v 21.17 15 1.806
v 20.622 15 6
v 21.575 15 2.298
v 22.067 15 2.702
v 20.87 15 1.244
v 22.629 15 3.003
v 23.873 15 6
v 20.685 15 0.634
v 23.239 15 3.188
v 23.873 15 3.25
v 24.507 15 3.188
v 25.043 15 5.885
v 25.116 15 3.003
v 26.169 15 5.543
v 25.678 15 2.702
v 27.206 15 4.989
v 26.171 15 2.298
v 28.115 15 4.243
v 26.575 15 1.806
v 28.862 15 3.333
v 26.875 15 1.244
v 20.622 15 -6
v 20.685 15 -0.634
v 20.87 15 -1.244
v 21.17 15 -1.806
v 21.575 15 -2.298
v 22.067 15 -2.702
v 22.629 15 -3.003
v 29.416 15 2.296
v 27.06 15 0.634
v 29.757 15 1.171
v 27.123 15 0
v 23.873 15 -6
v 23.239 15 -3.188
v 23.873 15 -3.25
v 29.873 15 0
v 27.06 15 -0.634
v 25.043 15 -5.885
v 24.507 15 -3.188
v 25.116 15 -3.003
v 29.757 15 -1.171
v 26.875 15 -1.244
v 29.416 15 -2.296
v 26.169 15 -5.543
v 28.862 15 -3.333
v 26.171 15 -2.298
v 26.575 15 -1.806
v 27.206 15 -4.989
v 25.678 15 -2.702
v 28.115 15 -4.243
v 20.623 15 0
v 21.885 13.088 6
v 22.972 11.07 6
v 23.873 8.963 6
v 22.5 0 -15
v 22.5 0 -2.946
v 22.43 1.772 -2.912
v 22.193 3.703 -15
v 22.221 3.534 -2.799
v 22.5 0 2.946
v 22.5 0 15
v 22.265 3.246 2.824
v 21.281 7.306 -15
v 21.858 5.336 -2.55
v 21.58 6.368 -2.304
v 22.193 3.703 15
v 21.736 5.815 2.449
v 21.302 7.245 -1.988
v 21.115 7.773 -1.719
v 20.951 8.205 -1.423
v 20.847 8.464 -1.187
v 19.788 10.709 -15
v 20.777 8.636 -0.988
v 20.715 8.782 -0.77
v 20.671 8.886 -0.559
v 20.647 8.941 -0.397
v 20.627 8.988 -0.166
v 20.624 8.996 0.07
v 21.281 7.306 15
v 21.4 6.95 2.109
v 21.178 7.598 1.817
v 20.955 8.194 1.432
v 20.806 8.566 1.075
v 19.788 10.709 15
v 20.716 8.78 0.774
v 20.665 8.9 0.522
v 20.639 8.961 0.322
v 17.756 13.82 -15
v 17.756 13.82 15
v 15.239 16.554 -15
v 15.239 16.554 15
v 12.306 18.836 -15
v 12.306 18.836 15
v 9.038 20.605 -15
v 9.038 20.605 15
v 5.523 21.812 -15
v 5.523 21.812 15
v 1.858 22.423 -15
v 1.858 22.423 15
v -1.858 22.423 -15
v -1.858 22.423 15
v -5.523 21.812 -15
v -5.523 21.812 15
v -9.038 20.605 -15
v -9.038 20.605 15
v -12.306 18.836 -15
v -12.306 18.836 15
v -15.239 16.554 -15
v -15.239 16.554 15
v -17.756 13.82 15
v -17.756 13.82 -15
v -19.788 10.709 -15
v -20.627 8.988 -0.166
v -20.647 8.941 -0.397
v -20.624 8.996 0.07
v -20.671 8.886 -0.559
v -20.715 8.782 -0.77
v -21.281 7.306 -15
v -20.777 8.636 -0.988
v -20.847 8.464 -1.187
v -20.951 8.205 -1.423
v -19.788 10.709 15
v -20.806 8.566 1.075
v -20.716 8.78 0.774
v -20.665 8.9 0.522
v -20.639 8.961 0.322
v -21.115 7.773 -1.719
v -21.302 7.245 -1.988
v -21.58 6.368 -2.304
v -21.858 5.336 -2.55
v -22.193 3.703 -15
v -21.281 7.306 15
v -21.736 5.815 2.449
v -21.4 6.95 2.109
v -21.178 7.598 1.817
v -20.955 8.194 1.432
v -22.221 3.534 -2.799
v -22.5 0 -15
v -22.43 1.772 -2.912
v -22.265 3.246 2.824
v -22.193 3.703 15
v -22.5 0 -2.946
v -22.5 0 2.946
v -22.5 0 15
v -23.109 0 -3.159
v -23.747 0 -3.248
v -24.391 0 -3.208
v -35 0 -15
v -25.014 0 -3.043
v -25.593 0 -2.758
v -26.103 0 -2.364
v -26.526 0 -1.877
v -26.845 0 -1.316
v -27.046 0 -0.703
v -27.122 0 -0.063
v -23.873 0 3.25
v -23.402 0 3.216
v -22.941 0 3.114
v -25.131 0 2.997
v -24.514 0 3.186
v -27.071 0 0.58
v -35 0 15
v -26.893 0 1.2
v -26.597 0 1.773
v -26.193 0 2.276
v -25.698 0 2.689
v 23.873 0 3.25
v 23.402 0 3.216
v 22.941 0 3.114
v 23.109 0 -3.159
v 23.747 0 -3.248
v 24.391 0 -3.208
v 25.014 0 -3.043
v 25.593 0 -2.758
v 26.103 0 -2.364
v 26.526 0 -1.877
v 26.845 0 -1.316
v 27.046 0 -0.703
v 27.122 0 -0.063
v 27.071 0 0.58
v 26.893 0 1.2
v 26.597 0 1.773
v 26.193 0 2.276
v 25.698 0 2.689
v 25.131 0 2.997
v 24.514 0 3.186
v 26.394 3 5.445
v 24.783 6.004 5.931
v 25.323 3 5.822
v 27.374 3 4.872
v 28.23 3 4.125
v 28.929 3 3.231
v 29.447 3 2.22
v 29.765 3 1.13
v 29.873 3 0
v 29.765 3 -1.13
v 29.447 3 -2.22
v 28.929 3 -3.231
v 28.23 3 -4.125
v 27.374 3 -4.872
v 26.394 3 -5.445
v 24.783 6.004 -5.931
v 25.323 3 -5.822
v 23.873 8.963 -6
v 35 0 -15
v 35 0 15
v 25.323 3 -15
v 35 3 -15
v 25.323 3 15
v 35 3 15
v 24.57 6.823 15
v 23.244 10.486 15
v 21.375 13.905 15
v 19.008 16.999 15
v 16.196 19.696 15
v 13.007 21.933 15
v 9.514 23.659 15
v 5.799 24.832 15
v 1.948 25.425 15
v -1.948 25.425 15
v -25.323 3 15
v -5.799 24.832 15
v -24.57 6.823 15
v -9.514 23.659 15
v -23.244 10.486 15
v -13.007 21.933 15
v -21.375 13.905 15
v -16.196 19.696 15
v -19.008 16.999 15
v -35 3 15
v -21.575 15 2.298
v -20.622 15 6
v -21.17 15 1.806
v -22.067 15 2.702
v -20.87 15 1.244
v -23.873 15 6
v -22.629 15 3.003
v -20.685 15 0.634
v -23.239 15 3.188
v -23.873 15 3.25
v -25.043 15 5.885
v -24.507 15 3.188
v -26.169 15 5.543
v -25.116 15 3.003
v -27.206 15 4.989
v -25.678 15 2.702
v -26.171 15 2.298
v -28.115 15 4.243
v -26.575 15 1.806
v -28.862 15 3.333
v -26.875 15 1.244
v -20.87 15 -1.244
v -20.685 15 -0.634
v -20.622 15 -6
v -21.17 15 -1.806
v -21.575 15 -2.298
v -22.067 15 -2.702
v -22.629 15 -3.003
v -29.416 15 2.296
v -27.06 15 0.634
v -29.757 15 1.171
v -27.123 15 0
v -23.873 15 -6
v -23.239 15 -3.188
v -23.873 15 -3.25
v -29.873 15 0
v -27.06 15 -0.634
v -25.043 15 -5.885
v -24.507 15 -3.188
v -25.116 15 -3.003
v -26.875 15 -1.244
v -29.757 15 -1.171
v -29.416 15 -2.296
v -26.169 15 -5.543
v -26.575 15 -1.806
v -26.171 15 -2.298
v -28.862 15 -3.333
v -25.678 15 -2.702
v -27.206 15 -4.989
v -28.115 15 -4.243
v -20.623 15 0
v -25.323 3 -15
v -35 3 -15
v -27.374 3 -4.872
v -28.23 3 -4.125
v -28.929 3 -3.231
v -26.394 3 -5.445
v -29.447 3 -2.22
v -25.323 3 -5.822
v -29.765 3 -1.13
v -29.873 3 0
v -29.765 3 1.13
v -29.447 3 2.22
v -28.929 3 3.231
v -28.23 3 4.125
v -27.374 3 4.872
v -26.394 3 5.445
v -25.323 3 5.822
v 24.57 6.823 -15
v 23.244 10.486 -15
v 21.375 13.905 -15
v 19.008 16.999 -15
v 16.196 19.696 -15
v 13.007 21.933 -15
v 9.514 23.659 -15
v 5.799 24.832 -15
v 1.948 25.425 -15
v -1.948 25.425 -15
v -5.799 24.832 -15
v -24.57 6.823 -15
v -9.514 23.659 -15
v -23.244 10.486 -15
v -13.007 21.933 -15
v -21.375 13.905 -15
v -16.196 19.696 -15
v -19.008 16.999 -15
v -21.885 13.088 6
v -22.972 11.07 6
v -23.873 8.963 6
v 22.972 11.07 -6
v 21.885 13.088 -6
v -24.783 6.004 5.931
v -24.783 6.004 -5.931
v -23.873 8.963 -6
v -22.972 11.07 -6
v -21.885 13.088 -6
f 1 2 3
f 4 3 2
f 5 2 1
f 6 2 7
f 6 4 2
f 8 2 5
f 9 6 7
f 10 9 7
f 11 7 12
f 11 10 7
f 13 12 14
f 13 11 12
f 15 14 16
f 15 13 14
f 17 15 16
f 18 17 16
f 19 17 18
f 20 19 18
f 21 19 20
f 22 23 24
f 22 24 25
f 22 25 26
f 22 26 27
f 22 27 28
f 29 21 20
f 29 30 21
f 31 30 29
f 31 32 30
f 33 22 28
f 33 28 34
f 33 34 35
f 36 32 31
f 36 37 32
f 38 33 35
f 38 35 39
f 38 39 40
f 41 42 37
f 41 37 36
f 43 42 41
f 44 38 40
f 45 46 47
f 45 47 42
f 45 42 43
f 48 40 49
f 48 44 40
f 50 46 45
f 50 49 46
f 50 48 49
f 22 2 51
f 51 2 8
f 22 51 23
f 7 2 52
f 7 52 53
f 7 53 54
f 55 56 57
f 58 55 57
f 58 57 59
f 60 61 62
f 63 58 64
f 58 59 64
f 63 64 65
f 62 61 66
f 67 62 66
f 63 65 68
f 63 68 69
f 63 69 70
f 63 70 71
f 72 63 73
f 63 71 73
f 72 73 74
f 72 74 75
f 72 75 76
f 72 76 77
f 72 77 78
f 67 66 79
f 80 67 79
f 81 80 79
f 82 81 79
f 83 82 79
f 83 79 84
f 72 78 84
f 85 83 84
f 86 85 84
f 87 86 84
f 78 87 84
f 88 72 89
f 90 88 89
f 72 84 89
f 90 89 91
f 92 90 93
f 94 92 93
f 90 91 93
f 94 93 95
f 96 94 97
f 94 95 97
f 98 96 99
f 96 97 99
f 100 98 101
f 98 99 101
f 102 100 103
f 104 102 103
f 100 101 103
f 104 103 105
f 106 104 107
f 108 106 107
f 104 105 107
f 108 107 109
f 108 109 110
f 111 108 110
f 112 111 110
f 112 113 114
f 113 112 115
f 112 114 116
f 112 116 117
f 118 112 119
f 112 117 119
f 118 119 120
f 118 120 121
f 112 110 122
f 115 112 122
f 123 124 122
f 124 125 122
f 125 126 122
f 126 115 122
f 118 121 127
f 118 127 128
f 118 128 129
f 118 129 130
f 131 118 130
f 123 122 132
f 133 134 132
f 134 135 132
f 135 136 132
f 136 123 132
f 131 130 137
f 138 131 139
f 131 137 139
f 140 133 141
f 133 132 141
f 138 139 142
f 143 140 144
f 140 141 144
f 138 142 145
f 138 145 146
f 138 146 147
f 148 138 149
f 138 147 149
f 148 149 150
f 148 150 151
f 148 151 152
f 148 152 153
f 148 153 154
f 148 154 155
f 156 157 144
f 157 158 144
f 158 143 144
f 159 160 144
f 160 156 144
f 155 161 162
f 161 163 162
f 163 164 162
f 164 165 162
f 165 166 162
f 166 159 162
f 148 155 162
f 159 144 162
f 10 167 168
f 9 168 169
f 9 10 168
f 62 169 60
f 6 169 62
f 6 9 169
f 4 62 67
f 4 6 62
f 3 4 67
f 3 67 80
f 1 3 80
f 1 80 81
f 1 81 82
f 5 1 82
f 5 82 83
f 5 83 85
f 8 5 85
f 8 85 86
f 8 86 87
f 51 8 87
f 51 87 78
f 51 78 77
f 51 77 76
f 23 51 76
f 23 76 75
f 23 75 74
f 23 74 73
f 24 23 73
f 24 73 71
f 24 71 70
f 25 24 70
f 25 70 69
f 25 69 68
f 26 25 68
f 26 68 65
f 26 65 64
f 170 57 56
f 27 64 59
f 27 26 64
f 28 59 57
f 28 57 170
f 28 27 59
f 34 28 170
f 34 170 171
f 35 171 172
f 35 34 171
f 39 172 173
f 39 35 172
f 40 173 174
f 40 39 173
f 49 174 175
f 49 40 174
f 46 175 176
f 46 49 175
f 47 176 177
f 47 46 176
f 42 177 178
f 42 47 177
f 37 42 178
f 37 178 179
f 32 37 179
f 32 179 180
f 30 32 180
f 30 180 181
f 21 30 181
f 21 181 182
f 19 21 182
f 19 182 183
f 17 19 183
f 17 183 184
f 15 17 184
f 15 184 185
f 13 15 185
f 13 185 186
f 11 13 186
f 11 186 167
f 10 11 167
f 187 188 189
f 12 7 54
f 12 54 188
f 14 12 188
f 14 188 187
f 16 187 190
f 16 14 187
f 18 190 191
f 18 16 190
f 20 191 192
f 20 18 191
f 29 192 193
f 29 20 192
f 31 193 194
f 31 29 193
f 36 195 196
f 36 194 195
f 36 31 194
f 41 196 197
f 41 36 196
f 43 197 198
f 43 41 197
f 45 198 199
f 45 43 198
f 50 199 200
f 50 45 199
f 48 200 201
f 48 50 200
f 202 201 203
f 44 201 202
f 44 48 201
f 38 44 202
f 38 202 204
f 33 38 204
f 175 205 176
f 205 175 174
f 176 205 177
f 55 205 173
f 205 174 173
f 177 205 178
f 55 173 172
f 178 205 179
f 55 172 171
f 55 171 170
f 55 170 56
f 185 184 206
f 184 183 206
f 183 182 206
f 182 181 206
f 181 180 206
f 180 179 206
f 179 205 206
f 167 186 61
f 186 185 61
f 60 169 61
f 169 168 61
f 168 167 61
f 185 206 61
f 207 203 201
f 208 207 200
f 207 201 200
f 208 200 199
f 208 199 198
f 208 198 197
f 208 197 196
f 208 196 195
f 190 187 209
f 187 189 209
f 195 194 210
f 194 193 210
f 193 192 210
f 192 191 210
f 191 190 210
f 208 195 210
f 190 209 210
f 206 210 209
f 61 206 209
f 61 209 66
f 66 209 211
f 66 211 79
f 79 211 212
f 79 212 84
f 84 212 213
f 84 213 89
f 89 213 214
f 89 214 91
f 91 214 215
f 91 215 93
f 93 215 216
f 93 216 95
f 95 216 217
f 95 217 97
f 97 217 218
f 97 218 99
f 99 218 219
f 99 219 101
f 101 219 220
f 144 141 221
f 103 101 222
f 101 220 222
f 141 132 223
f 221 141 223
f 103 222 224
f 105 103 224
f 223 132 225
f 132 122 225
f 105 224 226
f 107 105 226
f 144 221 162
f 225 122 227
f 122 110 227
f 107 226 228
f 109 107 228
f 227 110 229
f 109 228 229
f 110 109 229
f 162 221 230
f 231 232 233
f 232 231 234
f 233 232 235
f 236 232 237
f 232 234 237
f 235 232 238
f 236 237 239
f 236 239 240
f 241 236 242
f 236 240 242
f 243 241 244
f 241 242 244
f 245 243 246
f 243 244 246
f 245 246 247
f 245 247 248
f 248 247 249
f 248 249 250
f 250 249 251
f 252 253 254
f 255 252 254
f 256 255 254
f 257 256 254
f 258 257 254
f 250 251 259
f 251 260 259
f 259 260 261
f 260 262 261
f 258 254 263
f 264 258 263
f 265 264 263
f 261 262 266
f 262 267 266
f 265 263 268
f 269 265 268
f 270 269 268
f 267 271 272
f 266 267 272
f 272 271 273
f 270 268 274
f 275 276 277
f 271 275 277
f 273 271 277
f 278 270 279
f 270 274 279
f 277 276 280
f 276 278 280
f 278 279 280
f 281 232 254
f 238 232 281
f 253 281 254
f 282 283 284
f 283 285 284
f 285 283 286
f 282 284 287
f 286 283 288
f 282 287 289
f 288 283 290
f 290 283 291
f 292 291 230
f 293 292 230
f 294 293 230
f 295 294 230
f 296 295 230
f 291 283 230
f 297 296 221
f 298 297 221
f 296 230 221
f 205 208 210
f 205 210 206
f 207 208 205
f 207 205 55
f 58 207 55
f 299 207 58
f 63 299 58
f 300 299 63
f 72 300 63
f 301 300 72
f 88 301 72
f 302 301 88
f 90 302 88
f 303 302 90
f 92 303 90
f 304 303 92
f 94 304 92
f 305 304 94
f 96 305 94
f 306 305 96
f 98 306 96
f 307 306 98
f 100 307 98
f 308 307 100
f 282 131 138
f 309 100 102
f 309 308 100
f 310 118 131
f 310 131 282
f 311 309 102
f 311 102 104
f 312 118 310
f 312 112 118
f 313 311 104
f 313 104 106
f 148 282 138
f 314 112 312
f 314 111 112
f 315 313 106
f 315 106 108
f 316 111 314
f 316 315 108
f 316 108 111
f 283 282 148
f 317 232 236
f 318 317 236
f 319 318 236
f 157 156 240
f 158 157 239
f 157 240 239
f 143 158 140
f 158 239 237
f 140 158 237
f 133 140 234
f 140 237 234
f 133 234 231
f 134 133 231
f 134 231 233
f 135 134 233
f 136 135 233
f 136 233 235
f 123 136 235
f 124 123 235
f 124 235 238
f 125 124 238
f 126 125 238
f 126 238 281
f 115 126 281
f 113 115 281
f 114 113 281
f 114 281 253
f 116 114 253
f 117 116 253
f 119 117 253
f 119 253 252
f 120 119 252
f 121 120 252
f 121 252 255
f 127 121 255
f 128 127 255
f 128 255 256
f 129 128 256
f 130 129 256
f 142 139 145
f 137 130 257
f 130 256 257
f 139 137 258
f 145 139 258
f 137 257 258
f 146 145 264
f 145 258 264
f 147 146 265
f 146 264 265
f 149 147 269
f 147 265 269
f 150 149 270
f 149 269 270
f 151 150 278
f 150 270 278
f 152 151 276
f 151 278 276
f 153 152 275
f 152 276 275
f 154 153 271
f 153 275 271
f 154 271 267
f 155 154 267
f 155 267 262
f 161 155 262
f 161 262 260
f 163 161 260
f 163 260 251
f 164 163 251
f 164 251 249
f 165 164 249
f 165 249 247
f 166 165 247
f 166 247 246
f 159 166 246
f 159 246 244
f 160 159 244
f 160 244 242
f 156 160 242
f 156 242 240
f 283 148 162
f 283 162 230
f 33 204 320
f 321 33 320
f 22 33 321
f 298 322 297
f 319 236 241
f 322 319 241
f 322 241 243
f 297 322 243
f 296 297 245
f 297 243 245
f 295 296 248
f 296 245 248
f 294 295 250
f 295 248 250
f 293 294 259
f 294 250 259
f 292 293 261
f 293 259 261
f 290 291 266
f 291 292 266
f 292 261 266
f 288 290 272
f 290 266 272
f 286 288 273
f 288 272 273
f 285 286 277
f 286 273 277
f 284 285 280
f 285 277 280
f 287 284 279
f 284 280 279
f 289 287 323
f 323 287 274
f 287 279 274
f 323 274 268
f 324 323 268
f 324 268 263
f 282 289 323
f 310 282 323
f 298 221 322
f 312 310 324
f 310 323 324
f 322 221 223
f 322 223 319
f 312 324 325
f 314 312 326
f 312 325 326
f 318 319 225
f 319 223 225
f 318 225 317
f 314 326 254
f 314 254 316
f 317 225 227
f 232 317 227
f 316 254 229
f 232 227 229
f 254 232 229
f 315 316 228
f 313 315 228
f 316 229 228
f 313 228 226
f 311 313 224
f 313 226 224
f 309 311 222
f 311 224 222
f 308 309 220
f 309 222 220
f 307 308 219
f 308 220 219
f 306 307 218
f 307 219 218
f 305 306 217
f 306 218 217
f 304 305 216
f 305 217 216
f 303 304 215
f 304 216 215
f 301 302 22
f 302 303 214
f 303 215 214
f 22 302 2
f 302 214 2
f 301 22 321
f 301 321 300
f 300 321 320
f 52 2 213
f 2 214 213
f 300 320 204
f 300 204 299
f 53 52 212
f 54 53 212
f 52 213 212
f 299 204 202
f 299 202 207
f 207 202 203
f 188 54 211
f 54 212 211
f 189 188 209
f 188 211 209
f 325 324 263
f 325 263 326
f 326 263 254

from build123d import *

# Parameters (mm, degrees)
BOSS_EXTRUDE4_DEPTH = 15
BOSS_EXTRUDE5_REACH = 42.927
SKETCH8_R           = 3.25
CUT_EXTRUDE1_DEPTH  = 41.926763896


with BuildPart() as part:
    # Sketch2 → Boss-Extrude4 (new, symmetric)
    with BuildSketch(Plane.XY):
        with BuildLine():
            Line((-22.5, 0), (-35, 0))
            Line((-35, 0), (-35, 3))
            Line((-35, 3), (-25.322914524, 3))
            ThreePointArc((-25.322914524, 3), (0, 25.5), (25.322914524, 3))
            Line((25.322914524, 3), (35, 3))
            Line((35, 3), (35, 0))
            Line((35, 0), (22.5, 0))
            ThreePointArc((22.5, 0), (0, 22.5), (-22.5, 0))
        make_face()
    extrude(amount=BOSS_EXTRUDE4_DEPTH, both=True)

    # Sketch5 → Boss-Extrude5 (add, up to next)
    with BuildSketch(Plane(origin=(0, 15, 0), x_dir=(1, 0, 0), z_dir=(0, 1, 0)), mode=Mode.PRIVATE) as boss_extrude5_sk1:
        with BuildLine():
            Line((-23.872753943, 6), (-13.872753943, 6))
            Line((-13.872753943, 6), (-13.872753943, -6))
            Line((-13.872753943, -6), (-23.872753943, -6))
            ThreePointArc((-23.872753943, -6), (-29.872753943, 0), (-23.872753943, 6))
        make_face()
    boss_extrude5_tool1 = extrude(boss_extrude5_sk1.sketch, amount=-BOSS_EXTRUDE5_REACH, mode=Mode.PRIVATE) - part.part
    boss_extrude5 = boss_extrude5_tool1.solids().sort_by_distance((-21.289897, 15, 0))[0]
    add(boss_extrude5)

    # Sketch8 → Cut-Extrude1 (cut, through all)
    with BuildSketch(Plane(origin=(0, 15, 0), x_dir=(1, 0, 0), z_dir=(0, 1, 0))):
        with Locations(Location((-23.872753943, 0, 0), (0, 0, 270))):
            Circle(SKETCH8_R)
    cut_extrude1 = extrude(amount=-CUT_EXTRUDE1_DEPTH, mode=Mode.SUBTRACT)

    # Mirror1: Boss-Extrude5 across plane
    add(boss_extrude5.mirror(Plane(origin=(0, 0, 0), x_dir=(0, 0, 1), z_dir=(1, 0, 0))))

    # Mirror2: Cut-Extrude1 across plane
    add(cut_extrude1.mirror(Plane(origin=(0, 0, 0), x_dir=(0, 0, 1), z_dir=(1, 0, 0))), mode=Mode.SUBTRACT)


solid = part.part
